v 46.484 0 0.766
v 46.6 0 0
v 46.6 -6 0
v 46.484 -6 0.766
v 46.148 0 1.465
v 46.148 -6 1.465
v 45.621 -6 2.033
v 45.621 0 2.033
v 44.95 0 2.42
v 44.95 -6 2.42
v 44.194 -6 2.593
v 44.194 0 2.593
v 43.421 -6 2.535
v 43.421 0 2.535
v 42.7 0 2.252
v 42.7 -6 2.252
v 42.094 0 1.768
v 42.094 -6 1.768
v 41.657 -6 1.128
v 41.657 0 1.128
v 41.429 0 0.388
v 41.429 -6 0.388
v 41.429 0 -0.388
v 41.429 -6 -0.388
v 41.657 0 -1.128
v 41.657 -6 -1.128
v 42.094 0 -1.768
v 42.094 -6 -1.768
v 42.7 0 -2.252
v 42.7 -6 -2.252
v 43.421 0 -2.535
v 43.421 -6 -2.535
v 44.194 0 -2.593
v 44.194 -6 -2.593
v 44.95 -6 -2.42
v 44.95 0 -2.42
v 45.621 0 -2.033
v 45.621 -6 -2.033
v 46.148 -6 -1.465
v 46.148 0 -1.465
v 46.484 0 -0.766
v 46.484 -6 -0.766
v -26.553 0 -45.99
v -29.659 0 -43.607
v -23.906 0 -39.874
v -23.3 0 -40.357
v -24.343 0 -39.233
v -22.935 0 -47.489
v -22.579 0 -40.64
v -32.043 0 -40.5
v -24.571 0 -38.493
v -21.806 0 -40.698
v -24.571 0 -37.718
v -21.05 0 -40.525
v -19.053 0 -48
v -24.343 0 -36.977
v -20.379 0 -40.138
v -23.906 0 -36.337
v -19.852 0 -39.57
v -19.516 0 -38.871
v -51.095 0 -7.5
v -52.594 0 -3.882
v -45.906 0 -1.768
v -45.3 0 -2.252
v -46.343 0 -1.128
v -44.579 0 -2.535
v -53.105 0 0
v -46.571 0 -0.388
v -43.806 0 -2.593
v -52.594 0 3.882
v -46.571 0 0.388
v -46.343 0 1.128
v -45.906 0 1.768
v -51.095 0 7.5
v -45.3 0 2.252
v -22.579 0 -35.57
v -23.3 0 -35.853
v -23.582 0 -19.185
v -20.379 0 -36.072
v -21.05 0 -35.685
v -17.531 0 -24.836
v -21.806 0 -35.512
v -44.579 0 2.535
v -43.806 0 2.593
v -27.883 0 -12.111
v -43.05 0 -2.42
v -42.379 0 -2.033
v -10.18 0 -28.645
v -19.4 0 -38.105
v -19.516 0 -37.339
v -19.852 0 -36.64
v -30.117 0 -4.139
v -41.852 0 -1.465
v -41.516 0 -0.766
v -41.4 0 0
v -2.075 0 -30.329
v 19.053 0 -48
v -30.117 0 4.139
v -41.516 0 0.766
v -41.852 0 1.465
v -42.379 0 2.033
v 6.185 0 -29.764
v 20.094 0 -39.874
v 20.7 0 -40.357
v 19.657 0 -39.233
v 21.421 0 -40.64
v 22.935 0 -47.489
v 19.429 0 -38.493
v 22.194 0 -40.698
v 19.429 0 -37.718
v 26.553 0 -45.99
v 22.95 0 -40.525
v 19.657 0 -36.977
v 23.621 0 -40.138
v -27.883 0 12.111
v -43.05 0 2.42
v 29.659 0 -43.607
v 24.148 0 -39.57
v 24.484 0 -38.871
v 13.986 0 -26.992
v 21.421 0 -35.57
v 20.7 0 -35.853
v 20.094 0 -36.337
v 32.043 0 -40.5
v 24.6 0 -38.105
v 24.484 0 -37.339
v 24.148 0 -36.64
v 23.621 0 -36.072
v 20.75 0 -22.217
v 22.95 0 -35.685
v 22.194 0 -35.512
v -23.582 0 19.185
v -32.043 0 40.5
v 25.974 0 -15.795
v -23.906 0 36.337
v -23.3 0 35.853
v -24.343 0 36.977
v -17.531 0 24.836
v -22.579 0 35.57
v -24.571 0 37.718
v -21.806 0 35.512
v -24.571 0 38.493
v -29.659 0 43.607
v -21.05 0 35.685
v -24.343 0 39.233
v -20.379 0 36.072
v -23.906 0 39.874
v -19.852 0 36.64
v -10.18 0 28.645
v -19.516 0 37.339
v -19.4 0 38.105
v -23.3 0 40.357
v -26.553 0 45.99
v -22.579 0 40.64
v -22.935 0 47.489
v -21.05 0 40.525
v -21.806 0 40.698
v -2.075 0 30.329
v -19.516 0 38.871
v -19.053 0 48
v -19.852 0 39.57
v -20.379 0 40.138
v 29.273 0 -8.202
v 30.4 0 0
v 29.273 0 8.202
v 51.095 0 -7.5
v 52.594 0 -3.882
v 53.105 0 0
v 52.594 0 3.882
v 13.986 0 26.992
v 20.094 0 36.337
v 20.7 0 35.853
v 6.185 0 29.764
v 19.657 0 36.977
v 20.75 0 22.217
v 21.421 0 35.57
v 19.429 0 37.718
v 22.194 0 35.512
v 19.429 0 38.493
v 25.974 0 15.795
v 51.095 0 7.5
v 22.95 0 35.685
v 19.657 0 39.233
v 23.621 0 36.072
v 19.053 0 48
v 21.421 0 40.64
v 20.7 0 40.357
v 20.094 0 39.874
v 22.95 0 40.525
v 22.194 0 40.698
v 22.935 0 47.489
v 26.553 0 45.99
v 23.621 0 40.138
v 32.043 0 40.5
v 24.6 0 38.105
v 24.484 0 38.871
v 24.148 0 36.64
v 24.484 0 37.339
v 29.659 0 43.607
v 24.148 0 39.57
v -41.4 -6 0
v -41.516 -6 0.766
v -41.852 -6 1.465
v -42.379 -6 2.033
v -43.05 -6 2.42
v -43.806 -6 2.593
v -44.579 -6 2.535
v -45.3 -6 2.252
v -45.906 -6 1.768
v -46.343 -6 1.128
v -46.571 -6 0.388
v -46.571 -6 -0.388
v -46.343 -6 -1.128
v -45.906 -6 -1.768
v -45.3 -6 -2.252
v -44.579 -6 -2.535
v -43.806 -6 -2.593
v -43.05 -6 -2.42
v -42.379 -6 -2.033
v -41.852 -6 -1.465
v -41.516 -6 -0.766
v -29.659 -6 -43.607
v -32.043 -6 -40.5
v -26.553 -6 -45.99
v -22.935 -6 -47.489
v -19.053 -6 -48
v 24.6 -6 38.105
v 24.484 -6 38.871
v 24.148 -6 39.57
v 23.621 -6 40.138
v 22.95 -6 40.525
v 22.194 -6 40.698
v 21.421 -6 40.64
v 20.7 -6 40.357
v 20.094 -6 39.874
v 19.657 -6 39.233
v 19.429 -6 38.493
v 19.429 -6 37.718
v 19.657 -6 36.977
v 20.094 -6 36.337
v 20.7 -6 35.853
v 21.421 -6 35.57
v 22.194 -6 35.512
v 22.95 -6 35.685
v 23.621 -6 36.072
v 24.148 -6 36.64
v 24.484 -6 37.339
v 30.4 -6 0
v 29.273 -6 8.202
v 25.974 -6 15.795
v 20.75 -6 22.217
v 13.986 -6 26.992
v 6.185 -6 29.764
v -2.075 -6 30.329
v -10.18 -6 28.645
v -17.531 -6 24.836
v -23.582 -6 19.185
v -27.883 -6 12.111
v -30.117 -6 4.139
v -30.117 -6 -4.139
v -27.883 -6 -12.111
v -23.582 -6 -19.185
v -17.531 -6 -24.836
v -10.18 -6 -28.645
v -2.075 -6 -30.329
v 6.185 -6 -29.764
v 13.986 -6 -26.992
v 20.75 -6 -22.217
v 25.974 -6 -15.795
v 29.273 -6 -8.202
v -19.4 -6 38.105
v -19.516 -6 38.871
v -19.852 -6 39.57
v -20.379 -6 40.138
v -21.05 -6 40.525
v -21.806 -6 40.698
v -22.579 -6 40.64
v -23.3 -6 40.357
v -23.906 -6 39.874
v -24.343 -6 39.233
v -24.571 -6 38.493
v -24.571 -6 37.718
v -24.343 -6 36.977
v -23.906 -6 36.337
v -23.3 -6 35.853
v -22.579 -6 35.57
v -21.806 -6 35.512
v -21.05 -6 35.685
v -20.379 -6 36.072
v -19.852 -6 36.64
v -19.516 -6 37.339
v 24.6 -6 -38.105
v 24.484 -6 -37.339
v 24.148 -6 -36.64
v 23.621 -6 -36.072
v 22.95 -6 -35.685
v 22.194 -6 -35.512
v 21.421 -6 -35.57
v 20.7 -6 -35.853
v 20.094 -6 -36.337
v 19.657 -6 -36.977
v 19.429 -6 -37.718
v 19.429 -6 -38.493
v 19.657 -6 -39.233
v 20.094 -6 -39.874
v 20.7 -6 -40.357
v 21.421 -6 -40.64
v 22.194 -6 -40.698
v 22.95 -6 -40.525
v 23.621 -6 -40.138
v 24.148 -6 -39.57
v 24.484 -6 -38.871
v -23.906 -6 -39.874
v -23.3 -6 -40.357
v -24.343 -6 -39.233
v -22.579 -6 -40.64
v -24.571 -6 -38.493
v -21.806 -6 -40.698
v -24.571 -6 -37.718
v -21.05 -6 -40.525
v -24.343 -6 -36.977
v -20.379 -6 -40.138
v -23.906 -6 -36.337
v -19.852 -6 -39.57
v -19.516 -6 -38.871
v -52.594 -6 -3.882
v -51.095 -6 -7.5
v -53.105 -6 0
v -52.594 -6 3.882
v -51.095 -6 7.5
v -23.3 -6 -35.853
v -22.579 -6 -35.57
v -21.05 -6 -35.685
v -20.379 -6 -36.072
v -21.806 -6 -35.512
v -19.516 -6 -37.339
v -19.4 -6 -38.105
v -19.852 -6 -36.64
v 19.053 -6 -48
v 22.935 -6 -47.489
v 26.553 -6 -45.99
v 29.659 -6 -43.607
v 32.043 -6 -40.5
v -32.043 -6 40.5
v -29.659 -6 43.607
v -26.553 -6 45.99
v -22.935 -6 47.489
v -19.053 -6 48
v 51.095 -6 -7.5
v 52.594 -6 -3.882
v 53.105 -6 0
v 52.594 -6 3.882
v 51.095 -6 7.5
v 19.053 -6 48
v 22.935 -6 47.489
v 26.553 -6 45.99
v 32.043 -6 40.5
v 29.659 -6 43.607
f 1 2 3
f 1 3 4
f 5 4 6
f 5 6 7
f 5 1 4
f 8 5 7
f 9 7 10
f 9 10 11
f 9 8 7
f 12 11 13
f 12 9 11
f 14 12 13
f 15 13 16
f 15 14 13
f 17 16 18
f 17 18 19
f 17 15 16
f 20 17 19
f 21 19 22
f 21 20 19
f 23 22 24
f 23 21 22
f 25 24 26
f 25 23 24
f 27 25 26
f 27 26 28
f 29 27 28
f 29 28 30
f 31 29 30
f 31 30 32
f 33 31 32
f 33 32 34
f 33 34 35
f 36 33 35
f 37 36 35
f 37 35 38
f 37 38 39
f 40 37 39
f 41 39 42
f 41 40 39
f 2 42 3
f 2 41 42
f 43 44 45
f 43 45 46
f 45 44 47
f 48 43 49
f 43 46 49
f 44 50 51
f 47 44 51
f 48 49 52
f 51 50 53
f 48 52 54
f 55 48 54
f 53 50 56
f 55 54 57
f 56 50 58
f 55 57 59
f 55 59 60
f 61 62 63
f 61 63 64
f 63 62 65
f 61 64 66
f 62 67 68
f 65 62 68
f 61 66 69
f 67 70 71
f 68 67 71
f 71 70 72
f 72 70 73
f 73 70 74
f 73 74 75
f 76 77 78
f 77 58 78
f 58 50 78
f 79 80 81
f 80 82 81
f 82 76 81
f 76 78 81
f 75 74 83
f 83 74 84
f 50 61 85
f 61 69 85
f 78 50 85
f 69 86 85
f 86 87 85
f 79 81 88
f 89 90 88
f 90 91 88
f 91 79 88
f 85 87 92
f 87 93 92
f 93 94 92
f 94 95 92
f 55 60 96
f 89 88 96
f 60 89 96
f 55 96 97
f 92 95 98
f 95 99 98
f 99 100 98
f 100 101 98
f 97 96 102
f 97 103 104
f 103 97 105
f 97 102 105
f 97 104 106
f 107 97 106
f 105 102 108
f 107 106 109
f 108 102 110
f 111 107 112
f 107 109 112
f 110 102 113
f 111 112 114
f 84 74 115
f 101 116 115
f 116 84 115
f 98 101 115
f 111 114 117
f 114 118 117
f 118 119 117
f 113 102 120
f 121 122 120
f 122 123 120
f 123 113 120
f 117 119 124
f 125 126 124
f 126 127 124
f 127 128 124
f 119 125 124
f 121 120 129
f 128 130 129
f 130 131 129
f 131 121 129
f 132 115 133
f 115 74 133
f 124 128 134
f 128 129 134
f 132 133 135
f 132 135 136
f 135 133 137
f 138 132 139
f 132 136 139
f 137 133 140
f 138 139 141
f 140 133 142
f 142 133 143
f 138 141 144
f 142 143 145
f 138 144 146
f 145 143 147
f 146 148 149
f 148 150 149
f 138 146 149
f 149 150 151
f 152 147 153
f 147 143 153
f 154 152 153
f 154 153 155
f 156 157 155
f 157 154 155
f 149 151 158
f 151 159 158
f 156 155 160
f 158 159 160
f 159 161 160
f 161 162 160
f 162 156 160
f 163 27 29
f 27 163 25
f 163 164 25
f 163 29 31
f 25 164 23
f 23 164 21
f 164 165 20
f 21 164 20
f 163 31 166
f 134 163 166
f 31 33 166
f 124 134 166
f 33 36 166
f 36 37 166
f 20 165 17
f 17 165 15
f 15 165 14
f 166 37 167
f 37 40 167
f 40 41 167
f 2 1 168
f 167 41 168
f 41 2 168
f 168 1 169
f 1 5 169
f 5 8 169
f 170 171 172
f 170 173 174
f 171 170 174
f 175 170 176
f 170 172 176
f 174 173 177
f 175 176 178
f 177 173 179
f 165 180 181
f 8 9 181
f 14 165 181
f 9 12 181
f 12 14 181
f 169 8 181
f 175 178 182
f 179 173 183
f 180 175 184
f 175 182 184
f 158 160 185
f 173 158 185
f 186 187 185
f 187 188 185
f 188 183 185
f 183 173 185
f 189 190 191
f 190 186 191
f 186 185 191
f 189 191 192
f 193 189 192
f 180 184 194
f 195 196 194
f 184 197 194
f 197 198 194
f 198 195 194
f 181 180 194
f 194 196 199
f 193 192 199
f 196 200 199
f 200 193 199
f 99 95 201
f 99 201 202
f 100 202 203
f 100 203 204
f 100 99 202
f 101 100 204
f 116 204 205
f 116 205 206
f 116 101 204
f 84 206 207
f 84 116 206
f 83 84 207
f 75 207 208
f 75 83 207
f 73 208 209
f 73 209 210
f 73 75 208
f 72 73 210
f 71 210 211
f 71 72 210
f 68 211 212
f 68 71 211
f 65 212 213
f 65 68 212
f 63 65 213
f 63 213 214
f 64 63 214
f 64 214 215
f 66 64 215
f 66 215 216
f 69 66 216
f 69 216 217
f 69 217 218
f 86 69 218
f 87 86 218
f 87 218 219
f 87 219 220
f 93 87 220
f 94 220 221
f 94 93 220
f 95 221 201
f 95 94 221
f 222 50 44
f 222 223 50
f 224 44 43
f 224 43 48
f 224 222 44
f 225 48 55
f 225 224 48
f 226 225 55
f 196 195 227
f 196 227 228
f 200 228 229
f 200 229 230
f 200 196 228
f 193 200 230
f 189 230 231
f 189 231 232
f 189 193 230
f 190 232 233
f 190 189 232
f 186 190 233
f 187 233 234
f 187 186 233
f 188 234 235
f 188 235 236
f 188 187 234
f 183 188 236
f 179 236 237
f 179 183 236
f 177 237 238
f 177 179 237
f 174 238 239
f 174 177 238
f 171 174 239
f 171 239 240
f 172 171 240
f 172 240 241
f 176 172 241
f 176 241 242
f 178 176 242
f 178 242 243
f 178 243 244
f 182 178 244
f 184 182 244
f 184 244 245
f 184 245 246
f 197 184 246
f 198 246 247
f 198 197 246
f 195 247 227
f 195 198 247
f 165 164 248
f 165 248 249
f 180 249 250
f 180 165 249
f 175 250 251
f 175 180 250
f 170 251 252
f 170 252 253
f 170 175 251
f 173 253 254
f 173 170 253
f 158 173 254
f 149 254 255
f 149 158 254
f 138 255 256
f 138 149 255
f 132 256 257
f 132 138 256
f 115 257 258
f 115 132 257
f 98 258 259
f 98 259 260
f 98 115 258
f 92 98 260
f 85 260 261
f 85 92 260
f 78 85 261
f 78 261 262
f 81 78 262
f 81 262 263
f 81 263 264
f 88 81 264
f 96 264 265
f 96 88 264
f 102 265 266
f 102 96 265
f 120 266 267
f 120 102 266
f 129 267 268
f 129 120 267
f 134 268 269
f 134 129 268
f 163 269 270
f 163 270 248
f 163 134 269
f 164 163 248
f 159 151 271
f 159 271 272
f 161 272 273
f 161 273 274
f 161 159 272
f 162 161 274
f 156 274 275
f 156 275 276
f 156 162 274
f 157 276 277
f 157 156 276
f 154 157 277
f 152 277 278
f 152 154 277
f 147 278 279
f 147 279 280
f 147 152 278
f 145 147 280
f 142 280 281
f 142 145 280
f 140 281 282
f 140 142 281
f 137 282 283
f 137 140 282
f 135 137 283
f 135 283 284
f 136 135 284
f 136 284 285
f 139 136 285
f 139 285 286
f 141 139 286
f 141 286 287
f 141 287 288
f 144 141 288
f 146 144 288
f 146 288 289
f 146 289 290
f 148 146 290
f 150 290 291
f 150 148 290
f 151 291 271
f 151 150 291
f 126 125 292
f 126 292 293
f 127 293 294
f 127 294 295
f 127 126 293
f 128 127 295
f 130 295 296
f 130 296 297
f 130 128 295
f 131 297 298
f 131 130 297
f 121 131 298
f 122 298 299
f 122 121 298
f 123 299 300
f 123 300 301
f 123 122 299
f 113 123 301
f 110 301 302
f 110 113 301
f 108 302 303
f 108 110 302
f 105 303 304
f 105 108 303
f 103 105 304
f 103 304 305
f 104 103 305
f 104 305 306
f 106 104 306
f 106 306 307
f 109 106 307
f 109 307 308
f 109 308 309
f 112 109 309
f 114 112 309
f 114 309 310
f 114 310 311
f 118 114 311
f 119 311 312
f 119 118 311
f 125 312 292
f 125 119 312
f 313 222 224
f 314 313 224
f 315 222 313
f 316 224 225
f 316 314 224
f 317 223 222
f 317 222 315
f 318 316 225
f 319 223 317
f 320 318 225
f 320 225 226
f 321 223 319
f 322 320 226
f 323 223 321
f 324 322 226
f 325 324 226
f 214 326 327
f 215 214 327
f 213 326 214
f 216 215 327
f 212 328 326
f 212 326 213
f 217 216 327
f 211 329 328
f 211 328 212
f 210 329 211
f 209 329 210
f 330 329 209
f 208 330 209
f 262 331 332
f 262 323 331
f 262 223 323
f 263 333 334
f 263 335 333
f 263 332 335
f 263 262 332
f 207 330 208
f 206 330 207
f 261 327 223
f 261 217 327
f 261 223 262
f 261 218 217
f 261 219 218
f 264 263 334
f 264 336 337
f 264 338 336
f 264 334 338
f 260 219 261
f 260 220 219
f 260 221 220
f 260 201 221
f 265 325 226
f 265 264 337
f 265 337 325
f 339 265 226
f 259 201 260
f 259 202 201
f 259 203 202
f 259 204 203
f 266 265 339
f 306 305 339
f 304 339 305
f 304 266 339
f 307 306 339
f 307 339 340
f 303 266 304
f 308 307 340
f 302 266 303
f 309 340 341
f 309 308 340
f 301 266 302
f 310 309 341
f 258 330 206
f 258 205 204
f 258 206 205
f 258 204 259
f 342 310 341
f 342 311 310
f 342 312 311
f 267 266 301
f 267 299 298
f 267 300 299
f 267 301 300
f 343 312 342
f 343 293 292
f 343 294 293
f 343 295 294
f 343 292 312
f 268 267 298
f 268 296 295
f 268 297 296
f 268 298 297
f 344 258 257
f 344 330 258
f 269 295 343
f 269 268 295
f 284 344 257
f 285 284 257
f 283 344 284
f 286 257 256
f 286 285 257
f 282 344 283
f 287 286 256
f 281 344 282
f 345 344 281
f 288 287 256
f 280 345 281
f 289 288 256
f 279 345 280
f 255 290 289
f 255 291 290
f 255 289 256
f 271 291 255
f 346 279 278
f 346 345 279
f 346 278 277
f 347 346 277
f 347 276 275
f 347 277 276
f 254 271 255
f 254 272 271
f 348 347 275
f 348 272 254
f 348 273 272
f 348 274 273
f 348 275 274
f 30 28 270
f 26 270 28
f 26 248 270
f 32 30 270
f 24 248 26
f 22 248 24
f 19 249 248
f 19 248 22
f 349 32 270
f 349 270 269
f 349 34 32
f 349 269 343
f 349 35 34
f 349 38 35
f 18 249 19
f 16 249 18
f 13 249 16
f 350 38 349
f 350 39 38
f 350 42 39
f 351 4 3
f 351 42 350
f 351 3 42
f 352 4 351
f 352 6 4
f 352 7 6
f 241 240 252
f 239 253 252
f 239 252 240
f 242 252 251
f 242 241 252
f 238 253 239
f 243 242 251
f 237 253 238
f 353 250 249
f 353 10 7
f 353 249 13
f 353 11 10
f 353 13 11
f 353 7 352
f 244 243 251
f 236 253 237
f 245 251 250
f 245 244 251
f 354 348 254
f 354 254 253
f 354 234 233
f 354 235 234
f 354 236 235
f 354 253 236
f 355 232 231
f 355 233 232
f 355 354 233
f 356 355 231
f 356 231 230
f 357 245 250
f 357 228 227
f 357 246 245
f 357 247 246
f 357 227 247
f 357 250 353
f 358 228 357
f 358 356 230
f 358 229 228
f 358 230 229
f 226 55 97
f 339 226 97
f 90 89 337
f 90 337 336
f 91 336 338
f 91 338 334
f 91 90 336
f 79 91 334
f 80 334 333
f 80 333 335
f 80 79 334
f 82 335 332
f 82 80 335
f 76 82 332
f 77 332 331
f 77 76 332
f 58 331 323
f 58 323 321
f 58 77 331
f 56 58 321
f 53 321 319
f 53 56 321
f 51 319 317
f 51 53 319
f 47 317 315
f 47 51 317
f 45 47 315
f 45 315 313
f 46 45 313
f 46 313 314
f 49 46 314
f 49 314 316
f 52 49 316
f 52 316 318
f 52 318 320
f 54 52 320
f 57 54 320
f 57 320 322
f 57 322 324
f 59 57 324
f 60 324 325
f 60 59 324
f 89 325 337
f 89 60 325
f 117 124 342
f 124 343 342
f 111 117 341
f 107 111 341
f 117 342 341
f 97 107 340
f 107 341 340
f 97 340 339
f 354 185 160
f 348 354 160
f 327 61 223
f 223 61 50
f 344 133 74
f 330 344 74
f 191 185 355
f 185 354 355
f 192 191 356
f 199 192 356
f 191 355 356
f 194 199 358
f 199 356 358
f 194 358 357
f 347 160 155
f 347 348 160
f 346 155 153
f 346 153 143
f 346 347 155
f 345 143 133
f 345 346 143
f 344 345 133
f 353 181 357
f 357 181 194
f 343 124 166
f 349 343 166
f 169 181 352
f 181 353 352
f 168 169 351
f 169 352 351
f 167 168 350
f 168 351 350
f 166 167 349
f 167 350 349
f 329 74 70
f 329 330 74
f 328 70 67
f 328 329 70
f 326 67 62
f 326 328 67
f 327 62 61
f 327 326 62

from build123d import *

# Parameters (mm, degrees)
F0_R     = 2.6
F0_R_2   = 30.4
F1_DEPTH = 6
F2_R     = 15


with BuildPart() as f1:
    # F0 (on Front) → F1 (new body)
    with BuildSketch(Plane.XZ):
        Polygon((27.712813, 48), (-27.712813, 48), (-55.425626, 0), (-27.712813, -48), (27.712813, -48), (55.425626, 0), align=None)
        with Locations((-22, -38.105118)):
            Circle(F0_R, mode=Mode.SUBTRACT)
        with Locations((-44, 0)):
            Circle(F0_R, mode=Mode.SUBTRACT)
        Circle(F0_R_2, mode=Mode.SUBTRACT)
        with Locations((22, -38.105118)):
            Circle(F0_R, mode=Mode.SUBTRACT)
        with Locations((44, 0)):
            Circle(F0_R, mode=Mode.SUBTRACT)
        with Locations((-22, 38.105118)):
            Circle(F0_R, mode=Mode.SUBTRACT)
        with Locations((22, 38.105118)):
            Circle(F0_R, mode=Mode.SUBTRACT)
    extrude(amount=F1_DEPTH)

    # F2
    f2_edges = [f1.edges().sort_by_distance(p)[0] for p in [
        (-27.712813, -3, 48),
        (-55.425626, -3, 0),
        (-27.712813, -3, -48),
        (27.712813, -3, -48),
        (55.425626, -3, 0),
        (27.712813, -3, 48),
    ]]
    fillet(f2_edges, radius=F2_R)


solid = f1.part
